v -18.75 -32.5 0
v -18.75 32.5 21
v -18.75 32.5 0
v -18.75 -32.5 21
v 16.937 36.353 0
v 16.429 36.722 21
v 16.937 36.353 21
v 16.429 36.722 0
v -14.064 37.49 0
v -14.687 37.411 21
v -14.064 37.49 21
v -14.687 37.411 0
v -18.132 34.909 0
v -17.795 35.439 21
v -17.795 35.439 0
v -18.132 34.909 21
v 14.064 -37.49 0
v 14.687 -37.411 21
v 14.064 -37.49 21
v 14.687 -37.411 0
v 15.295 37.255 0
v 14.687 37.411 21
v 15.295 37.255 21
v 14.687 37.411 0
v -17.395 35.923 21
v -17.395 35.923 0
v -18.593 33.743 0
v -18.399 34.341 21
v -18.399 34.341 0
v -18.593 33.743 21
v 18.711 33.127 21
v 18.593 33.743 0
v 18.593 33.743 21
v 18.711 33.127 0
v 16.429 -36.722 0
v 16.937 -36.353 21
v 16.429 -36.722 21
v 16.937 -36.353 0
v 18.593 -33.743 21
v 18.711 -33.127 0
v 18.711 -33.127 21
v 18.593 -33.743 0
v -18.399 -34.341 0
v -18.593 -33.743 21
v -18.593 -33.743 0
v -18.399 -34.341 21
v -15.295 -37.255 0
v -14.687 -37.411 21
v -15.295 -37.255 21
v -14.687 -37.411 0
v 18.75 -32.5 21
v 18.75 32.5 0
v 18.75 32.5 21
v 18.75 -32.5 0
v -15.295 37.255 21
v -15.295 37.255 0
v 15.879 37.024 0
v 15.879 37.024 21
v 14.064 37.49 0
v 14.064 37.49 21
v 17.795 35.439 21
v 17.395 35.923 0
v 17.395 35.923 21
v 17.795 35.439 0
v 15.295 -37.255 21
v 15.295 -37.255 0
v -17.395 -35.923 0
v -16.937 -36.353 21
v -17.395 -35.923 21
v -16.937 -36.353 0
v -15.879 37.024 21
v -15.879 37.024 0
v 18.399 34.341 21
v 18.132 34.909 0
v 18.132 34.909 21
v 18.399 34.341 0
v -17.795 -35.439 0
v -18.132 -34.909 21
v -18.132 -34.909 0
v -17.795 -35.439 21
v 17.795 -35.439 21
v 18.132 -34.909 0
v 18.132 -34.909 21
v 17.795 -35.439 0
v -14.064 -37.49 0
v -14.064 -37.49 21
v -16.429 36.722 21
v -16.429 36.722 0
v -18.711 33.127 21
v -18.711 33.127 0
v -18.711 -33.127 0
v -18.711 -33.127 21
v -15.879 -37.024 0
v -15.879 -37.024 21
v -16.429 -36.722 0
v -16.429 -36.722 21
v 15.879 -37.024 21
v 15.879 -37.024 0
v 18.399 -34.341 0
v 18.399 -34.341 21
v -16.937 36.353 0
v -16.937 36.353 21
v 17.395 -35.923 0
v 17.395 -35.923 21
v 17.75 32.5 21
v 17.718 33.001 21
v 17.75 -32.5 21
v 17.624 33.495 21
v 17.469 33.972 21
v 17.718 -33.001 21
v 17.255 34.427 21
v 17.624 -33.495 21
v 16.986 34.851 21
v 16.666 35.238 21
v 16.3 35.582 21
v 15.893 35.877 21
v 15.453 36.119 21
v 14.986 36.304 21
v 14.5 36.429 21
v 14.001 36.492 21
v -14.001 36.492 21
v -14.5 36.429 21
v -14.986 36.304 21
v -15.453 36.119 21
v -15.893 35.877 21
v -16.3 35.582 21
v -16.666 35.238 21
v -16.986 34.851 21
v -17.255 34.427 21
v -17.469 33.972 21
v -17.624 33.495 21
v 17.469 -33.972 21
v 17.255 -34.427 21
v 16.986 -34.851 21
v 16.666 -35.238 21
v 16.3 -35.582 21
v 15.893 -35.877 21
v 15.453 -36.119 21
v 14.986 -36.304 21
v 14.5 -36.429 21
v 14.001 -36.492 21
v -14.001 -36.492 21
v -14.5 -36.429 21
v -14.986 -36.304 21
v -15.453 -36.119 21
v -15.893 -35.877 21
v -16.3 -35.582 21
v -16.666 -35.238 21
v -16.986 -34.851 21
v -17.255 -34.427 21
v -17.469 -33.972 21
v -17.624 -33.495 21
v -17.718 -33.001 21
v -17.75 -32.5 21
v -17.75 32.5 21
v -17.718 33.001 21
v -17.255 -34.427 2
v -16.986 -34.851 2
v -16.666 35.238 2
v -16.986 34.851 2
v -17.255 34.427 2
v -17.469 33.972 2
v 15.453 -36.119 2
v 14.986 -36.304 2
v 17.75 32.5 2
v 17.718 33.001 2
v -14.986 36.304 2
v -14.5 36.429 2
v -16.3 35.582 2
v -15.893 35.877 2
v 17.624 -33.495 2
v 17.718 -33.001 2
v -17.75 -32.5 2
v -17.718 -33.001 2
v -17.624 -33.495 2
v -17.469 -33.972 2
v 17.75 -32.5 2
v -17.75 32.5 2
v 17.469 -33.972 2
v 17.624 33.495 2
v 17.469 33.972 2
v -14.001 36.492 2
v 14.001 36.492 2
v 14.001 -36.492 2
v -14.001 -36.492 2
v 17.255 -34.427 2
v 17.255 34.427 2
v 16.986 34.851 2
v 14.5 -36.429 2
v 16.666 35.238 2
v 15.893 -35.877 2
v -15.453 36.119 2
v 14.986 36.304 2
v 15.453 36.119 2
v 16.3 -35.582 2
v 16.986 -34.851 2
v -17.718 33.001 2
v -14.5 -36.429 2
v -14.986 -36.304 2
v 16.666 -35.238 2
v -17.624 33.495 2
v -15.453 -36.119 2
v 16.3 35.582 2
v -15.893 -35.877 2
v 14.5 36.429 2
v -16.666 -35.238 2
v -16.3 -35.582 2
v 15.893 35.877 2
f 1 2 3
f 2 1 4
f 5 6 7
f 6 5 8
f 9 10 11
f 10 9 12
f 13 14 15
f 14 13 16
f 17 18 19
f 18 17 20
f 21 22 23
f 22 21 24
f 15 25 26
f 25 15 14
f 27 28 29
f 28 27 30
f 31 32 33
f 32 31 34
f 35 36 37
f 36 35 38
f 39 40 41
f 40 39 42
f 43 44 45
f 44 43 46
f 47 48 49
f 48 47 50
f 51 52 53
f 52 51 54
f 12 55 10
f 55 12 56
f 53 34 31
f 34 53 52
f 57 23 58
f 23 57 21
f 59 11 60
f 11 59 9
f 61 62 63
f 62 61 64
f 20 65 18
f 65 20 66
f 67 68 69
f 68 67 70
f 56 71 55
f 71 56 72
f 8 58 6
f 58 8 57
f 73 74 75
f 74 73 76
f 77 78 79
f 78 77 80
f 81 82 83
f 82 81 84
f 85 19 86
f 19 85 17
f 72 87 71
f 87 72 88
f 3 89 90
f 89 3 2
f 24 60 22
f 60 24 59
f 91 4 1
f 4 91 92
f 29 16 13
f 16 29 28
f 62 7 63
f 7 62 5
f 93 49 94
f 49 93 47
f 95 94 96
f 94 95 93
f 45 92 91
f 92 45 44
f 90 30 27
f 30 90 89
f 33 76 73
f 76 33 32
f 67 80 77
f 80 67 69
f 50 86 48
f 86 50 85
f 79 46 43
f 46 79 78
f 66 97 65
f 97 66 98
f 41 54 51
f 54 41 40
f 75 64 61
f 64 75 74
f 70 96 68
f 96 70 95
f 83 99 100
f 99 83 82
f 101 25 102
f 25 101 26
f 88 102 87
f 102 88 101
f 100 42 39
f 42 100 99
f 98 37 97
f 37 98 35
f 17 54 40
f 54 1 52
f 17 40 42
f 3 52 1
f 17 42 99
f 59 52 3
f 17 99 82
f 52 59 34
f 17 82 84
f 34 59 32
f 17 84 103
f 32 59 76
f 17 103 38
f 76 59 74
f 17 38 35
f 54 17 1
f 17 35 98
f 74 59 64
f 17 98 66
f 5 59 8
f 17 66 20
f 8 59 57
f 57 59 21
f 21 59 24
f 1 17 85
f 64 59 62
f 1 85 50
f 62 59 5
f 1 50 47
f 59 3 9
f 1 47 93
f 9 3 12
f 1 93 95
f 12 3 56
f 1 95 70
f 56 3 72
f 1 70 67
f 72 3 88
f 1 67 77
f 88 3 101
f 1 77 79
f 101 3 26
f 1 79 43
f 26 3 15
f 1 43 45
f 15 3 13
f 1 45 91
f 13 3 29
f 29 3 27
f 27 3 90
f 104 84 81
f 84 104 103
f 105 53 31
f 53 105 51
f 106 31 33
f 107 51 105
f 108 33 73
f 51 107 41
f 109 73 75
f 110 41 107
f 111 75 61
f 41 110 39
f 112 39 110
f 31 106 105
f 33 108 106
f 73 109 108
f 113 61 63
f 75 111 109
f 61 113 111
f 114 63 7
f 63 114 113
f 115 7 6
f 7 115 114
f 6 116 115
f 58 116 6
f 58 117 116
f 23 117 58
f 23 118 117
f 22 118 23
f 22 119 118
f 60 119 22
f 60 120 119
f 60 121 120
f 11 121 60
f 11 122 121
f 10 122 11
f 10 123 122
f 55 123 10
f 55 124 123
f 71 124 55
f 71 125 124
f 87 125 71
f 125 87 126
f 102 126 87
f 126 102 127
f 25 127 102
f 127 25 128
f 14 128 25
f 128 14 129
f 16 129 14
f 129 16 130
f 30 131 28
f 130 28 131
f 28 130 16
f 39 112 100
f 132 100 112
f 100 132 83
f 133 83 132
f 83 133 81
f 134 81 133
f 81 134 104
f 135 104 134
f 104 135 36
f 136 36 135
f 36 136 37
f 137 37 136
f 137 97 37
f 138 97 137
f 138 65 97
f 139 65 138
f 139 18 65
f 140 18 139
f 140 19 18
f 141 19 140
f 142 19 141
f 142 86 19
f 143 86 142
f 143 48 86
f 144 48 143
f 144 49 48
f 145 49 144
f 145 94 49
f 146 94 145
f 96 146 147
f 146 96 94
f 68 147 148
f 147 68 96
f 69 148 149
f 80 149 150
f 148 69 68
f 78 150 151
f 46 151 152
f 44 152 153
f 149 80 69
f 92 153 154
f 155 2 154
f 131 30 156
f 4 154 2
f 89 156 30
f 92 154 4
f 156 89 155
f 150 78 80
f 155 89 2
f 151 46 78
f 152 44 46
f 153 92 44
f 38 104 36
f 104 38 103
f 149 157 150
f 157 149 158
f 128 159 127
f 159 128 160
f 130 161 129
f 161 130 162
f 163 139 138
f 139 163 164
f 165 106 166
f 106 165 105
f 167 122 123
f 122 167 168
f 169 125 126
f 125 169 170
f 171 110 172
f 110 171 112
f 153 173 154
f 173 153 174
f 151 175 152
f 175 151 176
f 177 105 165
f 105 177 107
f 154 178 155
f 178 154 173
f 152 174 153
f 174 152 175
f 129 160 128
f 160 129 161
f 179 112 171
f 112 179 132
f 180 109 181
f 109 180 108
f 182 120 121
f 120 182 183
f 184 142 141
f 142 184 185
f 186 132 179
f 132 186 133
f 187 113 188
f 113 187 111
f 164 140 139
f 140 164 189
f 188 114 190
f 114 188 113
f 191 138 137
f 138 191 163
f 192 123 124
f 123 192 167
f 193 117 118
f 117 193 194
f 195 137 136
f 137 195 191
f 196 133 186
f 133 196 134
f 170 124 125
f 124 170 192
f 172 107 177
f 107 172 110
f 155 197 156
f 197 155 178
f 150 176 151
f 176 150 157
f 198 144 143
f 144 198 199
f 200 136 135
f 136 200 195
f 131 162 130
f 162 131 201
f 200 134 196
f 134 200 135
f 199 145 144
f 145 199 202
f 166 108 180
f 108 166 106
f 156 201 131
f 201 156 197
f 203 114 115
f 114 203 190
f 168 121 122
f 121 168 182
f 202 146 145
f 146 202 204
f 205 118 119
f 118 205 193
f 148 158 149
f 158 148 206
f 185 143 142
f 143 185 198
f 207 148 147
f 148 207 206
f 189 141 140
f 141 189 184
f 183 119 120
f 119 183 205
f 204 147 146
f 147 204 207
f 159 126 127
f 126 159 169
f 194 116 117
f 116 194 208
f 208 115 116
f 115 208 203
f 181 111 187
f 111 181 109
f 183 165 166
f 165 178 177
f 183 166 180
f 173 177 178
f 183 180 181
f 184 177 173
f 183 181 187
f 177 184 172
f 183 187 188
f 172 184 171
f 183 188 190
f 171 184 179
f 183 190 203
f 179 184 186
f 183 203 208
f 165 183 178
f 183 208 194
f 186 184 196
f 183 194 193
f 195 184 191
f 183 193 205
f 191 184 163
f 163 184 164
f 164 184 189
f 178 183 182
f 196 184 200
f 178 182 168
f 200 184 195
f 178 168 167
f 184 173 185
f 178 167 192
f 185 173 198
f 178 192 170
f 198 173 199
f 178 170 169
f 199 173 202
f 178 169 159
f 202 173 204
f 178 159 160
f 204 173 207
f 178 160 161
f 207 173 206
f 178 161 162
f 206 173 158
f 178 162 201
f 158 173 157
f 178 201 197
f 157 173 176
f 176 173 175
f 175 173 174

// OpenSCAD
$fn = 50;


difference() {
	union() {
		hull() {
			translate(v = [-13.7500000000, 32.5000000000, 0]) {
				cylinder(h = 21, r = 5);
			}
			translate(v = [13.7500000000, 32.5000000000, 0]) {
				cylinder(h = 21, r = 5);
			}
			translate(v = [-13.7500000000, -32.5000000000, 0]) {
				cylinder(h = 21, r = 5);
			}
			translate(v = [13.7500000000, -32.5000000000, 0]) {
				cylinder(h = 21, r = 5);
			}
		}
	}
	union() {
		translate(v = [0, 0, 2]) {
			hull() {
				translate(v = [-13.7500000000, 32.5000000000, 0]) {
					cylinder(h = 19, r = 4);
				}
				translate(v = [13.7500000000, 32.5000000000, 0]) {
					cylinder(h = 19, r = 4);
				}
				translate(v = [-13.7500000000, -32.5000000000, 0]) {
					cylinder(h = 19, r = 4);
				}
				translate(v = [13.7500000000, -32.5000000000, 0]) {
					cylinder(h = 19, r = 4);
				}
			}
		}
	}
}
